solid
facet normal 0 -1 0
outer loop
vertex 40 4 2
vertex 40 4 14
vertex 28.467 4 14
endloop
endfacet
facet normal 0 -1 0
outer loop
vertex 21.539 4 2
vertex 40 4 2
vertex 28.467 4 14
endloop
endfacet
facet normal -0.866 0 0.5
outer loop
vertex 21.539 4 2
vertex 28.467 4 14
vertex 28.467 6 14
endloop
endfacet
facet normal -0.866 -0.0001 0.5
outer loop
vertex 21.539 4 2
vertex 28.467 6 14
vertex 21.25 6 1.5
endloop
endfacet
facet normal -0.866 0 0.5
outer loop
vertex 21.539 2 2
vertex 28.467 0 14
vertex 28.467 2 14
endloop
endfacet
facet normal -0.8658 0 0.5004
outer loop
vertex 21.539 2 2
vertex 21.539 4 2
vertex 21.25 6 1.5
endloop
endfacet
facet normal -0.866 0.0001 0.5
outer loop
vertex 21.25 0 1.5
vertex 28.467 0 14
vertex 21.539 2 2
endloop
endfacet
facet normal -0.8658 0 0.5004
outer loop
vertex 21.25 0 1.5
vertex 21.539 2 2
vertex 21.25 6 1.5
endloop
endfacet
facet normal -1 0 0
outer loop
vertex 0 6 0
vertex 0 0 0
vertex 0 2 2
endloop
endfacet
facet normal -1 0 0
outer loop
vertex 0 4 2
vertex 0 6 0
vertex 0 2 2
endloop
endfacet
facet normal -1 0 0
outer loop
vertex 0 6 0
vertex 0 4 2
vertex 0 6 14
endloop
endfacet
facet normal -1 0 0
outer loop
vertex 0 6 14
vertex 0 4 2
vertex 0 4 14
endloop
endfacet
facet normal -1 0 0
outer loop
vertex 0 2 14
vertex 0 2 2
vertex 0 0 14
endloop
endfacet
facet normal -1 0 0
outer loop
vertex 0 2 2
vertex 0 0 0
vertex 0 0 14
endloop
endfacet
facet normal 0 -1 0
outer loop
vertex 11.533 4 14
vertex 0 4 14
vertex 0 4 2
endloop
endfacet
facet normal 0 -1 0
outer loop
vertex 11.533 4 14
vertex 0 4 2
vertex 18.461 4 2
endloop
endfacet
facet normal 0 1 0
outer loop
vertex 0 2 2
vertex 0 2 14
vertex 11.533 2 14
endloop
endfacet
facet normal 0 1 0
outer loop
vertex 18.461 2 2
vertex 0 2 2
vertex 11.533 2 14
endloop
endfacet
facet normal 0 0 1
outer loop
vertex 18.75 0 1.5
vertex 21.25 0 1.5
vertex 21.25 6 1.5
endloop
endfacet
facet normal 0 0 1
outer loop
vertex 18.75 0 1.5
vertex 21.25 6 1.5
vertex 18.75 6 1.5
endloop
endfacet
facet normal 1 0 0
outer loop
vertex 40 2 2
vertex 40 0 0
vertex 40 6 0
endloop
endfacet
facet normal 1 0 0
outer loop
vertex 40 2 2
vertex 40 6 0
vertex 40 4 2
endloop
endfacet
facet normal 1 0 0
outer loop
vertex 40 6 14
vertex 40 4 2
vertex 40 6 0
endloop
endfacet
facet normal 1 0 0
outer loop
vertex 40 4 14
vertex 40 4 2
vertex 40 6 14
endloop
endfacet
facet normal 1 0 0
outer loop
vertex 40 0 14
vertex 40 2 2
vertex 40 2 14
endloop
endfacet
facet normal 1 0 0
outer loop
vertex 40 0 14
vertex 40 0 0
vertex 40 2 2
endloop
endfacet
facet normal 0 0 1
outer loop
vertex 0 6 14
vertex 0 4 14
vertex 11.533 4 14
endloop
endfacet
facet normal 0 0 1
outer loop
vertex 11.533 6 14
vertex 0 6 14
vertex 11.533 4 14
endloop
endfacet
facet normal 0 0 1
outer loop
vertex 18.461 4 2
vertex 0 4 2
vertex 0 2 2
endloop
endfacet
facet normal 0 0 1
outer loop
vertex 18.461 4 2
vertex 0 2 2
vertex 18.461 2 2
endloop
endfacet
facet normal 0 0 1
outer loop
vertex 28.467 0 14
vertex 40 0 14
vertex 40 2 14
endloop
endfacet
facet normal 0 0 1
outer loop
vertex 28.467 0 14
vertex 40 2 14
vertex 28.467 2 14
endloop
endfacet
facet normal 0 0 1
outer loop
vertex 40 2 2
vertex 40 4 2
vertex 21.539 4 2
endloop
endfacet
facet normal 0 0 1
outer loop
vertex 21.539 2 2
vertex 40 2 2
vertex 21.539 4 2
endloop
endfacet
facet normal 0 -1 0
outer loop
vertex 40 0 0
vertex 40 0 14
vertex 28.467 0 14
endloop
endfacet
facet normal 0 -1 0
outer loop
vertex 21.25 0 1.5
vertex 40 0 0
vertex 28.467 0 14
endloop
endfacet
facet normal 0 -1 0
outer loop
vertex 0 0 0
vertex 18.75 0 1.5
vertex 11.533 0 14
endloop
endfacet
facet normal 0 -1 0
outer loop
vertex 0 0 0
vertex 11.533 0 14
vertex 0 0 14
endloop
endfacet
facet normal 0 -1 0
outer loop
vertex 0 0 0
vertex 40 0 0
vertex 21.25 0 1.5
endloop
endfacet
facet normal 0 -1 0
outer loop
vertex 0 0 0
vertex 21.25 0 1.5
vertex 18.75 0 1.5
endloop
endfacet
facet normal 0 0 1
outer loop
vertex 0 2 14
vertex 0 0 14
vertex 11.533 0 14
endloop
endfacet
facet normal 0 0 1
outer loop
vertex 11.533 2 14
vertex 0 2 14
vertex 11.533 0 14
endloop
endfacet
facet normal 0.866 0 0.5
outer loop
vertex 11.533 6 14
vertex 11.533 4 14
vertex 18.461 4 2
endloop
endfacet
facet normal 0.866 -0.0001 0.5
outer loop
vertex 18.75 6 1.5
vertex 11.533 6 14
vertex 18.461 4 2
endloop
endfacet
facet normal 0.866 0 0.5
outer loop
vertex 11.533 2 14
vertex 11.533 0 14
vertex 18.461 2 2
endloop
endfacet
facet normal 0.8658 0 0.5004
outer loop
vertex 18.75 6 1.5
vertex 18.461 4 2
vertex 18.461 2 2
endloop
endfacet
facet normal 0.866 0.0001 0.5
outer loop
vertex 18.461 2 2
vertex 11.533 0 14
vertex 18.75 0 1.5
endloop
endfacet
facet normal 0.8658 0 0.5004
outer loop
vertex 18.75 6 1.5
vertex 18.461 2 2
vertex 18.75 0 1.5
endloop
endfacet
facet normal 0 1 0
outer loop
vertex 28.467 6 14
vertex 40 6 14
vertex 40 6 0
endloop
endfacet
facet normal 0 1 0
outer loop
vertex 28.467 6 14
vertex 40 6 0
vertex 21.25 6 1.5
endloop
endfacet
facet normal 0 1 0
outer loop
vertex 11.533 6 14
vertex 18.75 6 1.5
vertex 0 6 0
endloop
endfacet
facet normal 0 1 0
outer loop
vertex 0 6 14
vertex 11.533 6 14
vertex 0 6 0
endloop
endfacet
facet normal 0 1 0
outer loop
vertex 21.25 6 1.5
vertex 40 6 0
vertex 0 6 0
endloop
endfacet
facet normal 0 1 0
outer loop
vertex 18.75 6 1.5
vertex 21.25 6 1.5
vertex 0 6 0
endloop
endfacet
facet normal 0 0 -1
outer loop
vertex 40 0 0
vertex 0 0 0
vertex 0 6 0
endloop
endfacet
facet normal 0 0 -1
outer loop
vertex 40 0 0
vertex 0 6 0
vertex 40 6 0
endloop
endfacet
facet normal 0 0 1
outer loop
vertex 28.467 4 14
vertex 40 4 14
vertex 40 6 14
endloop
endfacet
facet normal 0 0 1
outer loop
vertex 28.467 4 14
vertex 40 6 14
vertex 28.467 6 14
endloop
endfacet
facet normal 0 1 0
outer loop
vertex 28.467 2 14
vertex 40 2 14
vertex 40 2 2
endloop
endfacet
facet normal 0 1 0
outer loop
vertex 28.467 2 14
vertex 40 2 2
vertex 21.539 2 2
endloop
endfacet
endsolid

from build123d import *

# Parameters (mm, degrees)
BOSS_EXTRUDE1_DEPTH = 6
SHELL2_START        = 2
SHELL2_OUTLINE_W    = 20
SHELL2_OUTLINE_H    = 2
SHELL2_DEPTH        = 12


# Read off the part's stored shape, not the designer's step: Shell2
with BuildPart() as part:
    # Sketch1 → Boss-Extrude1 (new body)
    with BuildSketch(Plane(origin=(0, 0, 0), x_dir=(1, 0, 0), z_dir=(0, 1, 0))):
        Polygon((0, 0), (0, -14), (11.533121635, -14), (18.75, -1.5), (20, -1.5), (20, 0), align=None)
    extrude(amount=BOSS_EXTRUDE1_DEPTH)

    # Shell2 outline → Shell2 (cut)
    with BuildSketch(Plane.XY.offset(SHELL2_START)):
        with Locations((10, 3)):
            Rectangle(SHELL2_OUTLINE_W, SHELL2_OUTLINE_H)
    extrude(amount=SHELL2_DEPTH, mode=Mode.SUBTRACT)

    # Mirror1: part across plane


with BuildPart() as part_1:
    add(part.part)
    add(part.part.mirror(Plane(origin=(20, 0, 0), x_dir=(0, 0, 1), z_dir=(1, 0, 0))))


solid = part_1.part
